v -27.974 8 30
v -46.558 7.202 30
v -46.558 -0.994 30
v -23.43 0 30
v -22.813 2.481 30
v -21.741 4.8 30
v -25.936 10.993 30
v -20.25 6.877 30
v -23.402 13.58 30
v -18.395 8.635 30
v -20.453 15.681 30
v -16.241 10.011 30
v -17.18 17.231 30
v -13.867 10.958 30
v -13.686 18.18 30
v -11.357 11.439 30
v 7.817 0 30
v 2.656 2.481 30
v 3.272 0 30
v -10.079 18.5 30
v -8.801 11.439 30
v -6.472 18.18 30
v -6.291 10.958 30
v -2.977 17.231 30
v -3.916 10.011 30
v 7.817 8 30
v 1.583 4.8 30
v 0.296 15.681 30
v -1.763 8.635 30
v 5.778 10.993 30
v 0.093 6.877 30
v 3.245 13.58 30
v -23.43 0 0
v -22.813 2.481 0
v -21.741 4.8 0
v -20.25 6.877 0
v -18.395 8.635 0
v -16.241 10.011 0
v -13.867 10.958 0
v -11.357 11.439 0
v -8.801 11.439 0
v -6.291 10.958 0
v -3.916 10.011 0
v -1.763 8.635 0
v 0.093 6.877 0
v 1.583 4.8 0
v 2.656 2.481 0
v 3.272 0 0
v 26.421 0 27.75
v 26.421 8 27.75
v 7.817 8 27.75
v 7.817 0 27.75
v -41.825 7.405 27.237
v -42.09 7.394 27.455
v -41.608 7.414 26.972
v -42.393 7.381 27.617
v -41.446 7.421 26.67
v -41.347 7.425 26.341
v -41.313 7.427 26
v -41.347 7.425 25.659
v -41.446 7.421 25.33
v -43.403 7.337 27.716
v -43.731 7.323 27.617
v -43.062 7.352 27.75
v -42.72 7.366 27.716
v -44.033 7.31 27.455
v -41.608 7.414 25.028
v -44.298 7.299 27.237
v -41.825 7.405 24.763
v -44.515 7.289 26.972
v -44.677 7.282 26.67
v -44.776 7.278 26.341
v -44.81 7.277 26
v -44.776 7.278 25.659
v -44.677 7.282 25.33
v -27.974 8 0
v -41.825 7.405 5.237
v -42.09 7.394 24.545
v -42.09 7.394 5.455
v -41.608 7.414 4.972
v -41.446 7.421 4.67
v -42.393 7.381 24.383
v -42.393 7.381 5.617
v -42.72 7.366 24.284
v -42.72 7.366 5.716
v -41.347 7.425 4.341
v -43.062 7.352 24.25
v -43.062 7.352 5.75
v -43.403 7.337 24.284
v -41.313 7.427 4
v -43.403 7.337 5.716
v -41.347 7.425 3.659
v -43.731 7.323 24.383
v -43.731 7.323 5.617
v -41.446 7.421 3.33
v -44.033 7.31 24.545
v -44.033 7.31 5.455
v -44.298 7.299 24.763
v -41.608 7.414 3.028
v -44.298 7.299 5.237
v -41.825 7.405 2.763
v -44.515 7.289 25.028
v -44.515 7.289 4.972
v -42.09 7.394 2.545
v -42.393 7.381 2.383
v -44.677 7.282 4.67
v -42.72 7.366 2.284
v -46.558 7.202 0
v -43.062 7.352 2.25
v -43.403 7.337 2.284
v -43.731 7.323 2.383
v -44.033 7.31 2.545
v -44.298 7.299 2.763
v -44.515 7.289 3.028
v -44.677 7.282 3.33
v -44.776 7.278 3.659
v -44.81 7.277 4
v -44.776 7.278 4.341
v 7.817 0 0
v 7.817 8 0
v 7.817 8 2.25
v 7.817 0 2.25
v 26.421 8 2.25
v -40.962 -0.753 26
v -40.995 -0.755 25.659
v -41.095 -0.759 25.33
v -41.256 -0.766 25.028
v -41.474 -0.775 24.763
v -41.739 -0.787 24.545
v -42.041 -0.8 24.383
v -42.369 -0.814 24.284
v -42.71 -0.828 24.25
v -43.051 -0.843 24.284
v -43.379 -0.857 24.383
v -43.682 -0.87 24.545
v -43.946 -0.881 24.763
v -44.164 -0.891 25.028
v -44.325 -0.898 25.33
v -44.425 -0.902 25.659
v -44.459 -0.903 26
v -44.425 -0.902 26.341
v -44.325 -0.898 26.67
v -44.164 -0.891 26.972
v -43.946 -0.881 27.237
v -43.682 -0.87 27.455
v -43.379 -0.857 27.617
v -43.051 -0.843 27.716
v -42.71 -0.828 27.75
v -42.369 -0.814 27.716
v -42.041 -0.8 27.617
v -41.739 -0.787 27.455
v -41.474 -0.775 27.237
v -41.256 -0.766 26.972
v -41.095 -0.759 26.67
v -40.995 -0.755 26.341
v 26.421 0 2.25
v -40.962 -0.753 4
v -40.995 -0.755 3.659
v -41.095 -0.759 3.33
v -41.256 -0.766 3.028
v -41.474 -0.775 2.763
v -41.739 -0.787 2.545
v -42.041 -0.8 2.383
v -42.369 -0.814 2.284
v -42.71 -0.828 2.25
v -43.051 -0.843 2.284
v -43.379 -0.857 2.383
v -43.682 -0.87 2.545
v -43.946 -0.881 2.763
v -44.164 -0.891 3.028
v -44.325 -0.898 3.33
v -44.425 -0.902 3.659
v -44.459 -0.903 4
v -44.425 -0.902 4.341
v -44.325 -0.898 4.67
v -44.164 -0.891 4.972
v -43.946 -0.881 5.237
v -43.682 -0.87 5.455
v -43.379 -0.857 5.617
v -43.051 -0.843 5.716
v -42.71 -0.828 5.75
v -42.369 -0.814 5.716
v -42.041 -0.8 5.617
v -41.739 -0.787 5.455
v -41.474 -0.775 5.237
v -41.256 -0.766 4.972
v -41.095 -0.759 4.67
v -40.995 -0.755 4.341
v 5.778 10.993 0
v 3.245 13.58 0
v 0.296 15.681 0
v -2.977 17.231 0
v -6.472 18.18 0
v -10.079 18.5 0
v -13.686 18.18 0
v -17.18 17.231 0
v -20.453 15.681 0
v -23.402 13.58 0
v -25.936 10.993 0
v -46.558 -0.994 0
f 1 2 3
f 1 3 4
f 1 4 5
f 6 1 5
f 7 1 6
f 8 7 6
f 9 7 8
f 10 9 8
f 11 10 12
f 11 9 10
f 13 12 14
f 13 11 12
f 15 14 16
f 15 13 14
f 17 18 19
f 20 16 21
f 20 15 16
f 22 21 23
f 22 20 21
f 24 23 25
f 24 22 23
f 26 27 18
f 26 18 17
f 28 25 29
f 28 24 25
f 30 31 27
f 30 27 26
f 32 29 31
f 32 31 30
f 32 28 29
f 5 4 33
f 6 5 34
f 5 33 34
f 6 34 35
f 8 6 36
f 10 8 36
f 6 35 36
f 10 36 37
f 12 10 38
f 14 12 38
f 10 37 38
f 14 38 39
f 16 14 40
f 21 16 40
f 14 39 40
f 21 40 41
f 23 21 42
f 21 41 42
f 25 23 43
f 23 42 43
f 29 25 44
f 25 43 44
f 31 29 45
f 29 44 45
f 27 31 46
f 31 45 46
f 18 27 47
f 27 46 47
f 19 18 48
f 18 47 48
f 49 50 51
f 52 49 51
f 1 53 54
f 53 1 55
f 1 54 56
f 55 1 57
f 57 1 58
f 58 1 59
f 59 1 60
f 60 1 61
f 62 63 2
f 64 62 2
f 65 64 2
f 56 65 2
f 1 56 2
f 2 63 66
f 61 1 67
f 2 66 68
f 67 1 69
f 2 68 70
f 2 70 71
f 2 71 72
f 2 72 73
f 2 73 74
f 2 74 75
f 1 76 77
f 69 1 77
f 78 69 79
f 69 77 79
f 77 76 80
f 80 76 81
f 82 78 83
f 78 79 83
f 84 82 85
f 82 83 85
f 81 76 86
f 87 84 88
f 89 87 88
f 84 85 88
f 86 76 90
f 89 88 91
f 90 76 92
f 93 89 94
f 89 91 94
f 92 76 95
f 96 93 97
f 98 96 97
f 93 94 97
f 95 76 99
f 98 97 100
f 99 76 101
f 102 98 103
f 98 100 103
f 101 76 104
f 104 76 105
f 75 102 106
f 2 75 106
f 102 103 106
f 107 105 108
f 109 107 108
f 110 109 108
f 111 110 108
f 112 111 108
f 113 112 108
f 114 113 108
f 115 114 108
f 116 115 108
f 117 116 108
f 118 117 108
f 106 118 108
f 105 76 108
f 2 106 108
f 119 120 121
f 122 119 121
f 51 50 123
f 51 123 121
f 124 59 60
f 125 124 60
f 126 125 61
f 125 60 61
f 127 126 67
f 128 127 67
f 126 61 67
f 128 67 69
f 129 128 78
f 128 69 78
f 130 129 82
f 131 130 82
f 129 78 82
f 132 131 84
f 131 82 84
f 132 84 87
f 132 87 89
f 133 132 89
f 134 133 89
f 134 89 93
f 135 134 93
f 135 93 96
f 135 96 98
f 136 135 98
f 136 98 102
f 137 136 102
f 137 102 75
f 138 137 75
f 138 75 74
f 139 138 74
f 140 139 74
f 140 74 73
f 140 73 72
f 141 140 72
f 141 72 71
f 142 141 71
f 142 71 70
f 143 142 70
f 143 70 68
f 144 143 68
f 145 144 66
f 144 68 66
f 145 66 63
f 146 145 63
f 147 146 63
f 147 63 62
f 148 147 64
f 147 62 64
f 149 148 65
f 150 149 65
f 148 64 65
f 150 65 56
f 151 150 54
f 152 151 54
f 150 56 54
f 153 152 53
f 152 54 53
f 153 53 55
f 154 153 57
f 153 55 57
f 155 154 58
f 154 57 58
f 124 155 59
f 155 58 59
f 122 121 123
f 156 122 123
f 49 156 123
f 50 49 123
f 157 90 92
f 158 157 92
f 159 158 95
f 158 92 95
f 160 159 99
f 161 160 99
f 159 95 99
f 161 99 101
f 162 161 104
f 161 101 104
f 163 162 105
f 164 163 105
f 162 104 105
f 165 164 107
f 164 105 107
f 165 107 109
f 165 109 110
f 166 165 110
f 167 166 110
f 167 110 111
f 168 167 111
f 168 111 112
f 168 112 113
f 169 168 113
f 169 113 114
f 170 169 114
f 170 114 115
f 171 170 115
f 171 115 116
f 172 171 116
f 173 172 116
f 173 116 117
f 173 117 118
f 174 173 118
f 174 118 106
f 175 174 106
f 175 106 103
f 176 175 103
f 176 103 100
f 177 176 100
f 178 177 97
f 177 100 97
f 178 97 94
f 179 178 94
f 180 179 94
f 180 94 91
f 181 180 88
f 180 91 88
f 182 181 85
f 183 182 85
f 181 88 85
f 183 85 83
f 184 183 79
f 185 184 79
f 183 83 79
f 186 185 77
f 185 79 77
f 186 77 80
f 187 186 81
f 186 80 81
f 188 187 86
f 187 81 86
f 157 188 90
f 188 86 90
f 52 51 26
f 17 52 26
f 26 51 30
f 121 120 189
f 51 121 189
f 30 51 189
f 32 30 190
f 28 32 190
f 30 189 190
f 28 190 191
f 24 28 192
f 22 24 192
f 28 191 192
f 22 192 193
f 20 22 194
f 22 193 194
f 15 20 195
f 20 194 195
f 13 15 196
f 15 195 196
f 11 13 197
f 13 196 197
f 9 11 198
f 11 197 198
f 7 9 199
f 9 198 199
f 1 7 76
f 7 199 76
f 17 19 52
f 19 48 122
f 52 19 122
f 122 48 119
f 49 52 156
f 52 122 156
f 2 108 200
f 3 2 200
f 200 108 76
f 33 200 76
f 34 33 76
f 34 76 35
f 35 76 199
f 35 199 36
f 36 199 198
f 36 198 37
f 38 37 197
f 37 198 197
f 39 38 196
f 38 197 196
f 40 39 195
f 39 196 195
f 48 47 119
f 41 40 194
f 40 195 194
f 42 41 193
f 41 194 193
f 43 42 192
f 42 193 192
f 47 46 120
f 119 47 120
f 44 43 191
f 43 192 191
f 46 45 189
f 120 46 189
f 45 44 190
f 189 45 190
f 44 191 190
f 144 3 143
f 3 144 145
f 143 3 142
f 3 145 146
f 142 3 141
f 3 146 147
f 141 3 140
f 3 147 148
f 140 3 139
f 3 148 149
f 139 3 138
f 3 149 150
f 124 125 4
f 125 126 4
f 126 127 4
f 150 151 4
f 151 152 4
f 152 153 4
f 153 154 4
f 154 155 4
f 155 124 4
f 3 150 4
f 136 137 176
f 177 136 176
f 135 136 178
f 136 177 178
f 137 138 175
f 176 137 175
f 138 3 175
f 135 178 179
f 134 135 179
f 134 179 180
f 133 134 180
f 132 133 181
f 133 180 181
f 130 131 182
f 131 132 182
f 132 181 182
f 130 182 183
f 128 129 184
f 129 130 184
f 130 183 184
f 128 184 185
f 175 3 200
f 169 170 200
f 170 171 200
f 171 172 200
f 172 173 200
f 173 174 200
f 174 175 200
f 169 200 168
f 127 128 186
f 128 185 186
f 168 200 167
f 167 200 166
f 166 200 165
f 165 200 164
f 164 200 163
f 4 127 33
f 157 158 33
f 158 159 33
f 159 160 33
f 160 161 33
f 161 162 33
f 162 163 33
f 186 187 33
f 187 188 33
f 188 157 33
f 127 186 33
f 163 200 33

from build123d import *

# Parameters (mm, degrees)
SALIENTE_EXTRUIR1_DEPTH = 30
CORTAR_EXTRUIR1_DEPTH   = 10
CROQUIS4_R              = 1.75
CORTAR_EXTRUIR2_DEPTH   = 10


with BuildPart() as part:
    # Croquis1 → Saliente-Extruir1 (new body)
    with BuildSketch(Plane.XY):
        with BuildLine():
            Line((26.421334586, 0), (26.421334586, 8))
            Line((26.421334586, 8), (7.816864755, 8))
            ThreePointArc((7.816864755, 8), (-10.078665414, 18.5), (-27.974195582, 8))
            Line((-27.974195582, 8), (-46.558360995, 7.201596348))
            Line((-46.558360995, 7.201596348), (-46.558360995, -0.993642206))
            Line((-46.558360995, -0.993642206), (-23.429695336, 0))
            ThreePointArc((-23.429695336, 0), (-10.078665414, 11.5), (3.272364509, 0))
            Line((3.272364509, 0), (26.421334586, 0))
        make_face()
    extrude(amount=SALIENTE_EXTRUIR1_DEPTH)

    # Croquis3 → Cortar-Extruir1 (cut)
    with BuildSketch(Plane(origin=(0, 8, 0), x_dir=(1, 0, 0), z_dir=(0, 1, 0))):
        Polygon((26.421334586, -2.25), (26.421334586, -27.75), (7.816864755, -27.75), (7.816864755, -33.359079395), (34.243736359, -33.359079395), (34.243736359, 4.857090857), (7.816864755, 4.857090857), (7.816864755, -2.25), align=None)
    extrude(amount=-CORTAR_EXTRUIR1_DEPTH, mode=Mode.SUBTRACT)

    # Croquis4 → Cortar-Extruir2 (cut)
    with BuildSketch(Plane(origin=(-0.394595422, 9.184861036, 0), x_dir=(0.99907843, 0.04292191, 0), z_dir=(-0.04292191, 0.99907843, 0))):
        with Locations((-42.706347949, -26)):
            Circle(CROQUIS4_R)
        with Locations((-42.706347949, -4)):
            Circle(CROQUIS4_R)
    extrude(amount=-CORTAR_EXTRUIR2_DEPTH, mode=Mode.SUBTRACT)


solid = part.part
